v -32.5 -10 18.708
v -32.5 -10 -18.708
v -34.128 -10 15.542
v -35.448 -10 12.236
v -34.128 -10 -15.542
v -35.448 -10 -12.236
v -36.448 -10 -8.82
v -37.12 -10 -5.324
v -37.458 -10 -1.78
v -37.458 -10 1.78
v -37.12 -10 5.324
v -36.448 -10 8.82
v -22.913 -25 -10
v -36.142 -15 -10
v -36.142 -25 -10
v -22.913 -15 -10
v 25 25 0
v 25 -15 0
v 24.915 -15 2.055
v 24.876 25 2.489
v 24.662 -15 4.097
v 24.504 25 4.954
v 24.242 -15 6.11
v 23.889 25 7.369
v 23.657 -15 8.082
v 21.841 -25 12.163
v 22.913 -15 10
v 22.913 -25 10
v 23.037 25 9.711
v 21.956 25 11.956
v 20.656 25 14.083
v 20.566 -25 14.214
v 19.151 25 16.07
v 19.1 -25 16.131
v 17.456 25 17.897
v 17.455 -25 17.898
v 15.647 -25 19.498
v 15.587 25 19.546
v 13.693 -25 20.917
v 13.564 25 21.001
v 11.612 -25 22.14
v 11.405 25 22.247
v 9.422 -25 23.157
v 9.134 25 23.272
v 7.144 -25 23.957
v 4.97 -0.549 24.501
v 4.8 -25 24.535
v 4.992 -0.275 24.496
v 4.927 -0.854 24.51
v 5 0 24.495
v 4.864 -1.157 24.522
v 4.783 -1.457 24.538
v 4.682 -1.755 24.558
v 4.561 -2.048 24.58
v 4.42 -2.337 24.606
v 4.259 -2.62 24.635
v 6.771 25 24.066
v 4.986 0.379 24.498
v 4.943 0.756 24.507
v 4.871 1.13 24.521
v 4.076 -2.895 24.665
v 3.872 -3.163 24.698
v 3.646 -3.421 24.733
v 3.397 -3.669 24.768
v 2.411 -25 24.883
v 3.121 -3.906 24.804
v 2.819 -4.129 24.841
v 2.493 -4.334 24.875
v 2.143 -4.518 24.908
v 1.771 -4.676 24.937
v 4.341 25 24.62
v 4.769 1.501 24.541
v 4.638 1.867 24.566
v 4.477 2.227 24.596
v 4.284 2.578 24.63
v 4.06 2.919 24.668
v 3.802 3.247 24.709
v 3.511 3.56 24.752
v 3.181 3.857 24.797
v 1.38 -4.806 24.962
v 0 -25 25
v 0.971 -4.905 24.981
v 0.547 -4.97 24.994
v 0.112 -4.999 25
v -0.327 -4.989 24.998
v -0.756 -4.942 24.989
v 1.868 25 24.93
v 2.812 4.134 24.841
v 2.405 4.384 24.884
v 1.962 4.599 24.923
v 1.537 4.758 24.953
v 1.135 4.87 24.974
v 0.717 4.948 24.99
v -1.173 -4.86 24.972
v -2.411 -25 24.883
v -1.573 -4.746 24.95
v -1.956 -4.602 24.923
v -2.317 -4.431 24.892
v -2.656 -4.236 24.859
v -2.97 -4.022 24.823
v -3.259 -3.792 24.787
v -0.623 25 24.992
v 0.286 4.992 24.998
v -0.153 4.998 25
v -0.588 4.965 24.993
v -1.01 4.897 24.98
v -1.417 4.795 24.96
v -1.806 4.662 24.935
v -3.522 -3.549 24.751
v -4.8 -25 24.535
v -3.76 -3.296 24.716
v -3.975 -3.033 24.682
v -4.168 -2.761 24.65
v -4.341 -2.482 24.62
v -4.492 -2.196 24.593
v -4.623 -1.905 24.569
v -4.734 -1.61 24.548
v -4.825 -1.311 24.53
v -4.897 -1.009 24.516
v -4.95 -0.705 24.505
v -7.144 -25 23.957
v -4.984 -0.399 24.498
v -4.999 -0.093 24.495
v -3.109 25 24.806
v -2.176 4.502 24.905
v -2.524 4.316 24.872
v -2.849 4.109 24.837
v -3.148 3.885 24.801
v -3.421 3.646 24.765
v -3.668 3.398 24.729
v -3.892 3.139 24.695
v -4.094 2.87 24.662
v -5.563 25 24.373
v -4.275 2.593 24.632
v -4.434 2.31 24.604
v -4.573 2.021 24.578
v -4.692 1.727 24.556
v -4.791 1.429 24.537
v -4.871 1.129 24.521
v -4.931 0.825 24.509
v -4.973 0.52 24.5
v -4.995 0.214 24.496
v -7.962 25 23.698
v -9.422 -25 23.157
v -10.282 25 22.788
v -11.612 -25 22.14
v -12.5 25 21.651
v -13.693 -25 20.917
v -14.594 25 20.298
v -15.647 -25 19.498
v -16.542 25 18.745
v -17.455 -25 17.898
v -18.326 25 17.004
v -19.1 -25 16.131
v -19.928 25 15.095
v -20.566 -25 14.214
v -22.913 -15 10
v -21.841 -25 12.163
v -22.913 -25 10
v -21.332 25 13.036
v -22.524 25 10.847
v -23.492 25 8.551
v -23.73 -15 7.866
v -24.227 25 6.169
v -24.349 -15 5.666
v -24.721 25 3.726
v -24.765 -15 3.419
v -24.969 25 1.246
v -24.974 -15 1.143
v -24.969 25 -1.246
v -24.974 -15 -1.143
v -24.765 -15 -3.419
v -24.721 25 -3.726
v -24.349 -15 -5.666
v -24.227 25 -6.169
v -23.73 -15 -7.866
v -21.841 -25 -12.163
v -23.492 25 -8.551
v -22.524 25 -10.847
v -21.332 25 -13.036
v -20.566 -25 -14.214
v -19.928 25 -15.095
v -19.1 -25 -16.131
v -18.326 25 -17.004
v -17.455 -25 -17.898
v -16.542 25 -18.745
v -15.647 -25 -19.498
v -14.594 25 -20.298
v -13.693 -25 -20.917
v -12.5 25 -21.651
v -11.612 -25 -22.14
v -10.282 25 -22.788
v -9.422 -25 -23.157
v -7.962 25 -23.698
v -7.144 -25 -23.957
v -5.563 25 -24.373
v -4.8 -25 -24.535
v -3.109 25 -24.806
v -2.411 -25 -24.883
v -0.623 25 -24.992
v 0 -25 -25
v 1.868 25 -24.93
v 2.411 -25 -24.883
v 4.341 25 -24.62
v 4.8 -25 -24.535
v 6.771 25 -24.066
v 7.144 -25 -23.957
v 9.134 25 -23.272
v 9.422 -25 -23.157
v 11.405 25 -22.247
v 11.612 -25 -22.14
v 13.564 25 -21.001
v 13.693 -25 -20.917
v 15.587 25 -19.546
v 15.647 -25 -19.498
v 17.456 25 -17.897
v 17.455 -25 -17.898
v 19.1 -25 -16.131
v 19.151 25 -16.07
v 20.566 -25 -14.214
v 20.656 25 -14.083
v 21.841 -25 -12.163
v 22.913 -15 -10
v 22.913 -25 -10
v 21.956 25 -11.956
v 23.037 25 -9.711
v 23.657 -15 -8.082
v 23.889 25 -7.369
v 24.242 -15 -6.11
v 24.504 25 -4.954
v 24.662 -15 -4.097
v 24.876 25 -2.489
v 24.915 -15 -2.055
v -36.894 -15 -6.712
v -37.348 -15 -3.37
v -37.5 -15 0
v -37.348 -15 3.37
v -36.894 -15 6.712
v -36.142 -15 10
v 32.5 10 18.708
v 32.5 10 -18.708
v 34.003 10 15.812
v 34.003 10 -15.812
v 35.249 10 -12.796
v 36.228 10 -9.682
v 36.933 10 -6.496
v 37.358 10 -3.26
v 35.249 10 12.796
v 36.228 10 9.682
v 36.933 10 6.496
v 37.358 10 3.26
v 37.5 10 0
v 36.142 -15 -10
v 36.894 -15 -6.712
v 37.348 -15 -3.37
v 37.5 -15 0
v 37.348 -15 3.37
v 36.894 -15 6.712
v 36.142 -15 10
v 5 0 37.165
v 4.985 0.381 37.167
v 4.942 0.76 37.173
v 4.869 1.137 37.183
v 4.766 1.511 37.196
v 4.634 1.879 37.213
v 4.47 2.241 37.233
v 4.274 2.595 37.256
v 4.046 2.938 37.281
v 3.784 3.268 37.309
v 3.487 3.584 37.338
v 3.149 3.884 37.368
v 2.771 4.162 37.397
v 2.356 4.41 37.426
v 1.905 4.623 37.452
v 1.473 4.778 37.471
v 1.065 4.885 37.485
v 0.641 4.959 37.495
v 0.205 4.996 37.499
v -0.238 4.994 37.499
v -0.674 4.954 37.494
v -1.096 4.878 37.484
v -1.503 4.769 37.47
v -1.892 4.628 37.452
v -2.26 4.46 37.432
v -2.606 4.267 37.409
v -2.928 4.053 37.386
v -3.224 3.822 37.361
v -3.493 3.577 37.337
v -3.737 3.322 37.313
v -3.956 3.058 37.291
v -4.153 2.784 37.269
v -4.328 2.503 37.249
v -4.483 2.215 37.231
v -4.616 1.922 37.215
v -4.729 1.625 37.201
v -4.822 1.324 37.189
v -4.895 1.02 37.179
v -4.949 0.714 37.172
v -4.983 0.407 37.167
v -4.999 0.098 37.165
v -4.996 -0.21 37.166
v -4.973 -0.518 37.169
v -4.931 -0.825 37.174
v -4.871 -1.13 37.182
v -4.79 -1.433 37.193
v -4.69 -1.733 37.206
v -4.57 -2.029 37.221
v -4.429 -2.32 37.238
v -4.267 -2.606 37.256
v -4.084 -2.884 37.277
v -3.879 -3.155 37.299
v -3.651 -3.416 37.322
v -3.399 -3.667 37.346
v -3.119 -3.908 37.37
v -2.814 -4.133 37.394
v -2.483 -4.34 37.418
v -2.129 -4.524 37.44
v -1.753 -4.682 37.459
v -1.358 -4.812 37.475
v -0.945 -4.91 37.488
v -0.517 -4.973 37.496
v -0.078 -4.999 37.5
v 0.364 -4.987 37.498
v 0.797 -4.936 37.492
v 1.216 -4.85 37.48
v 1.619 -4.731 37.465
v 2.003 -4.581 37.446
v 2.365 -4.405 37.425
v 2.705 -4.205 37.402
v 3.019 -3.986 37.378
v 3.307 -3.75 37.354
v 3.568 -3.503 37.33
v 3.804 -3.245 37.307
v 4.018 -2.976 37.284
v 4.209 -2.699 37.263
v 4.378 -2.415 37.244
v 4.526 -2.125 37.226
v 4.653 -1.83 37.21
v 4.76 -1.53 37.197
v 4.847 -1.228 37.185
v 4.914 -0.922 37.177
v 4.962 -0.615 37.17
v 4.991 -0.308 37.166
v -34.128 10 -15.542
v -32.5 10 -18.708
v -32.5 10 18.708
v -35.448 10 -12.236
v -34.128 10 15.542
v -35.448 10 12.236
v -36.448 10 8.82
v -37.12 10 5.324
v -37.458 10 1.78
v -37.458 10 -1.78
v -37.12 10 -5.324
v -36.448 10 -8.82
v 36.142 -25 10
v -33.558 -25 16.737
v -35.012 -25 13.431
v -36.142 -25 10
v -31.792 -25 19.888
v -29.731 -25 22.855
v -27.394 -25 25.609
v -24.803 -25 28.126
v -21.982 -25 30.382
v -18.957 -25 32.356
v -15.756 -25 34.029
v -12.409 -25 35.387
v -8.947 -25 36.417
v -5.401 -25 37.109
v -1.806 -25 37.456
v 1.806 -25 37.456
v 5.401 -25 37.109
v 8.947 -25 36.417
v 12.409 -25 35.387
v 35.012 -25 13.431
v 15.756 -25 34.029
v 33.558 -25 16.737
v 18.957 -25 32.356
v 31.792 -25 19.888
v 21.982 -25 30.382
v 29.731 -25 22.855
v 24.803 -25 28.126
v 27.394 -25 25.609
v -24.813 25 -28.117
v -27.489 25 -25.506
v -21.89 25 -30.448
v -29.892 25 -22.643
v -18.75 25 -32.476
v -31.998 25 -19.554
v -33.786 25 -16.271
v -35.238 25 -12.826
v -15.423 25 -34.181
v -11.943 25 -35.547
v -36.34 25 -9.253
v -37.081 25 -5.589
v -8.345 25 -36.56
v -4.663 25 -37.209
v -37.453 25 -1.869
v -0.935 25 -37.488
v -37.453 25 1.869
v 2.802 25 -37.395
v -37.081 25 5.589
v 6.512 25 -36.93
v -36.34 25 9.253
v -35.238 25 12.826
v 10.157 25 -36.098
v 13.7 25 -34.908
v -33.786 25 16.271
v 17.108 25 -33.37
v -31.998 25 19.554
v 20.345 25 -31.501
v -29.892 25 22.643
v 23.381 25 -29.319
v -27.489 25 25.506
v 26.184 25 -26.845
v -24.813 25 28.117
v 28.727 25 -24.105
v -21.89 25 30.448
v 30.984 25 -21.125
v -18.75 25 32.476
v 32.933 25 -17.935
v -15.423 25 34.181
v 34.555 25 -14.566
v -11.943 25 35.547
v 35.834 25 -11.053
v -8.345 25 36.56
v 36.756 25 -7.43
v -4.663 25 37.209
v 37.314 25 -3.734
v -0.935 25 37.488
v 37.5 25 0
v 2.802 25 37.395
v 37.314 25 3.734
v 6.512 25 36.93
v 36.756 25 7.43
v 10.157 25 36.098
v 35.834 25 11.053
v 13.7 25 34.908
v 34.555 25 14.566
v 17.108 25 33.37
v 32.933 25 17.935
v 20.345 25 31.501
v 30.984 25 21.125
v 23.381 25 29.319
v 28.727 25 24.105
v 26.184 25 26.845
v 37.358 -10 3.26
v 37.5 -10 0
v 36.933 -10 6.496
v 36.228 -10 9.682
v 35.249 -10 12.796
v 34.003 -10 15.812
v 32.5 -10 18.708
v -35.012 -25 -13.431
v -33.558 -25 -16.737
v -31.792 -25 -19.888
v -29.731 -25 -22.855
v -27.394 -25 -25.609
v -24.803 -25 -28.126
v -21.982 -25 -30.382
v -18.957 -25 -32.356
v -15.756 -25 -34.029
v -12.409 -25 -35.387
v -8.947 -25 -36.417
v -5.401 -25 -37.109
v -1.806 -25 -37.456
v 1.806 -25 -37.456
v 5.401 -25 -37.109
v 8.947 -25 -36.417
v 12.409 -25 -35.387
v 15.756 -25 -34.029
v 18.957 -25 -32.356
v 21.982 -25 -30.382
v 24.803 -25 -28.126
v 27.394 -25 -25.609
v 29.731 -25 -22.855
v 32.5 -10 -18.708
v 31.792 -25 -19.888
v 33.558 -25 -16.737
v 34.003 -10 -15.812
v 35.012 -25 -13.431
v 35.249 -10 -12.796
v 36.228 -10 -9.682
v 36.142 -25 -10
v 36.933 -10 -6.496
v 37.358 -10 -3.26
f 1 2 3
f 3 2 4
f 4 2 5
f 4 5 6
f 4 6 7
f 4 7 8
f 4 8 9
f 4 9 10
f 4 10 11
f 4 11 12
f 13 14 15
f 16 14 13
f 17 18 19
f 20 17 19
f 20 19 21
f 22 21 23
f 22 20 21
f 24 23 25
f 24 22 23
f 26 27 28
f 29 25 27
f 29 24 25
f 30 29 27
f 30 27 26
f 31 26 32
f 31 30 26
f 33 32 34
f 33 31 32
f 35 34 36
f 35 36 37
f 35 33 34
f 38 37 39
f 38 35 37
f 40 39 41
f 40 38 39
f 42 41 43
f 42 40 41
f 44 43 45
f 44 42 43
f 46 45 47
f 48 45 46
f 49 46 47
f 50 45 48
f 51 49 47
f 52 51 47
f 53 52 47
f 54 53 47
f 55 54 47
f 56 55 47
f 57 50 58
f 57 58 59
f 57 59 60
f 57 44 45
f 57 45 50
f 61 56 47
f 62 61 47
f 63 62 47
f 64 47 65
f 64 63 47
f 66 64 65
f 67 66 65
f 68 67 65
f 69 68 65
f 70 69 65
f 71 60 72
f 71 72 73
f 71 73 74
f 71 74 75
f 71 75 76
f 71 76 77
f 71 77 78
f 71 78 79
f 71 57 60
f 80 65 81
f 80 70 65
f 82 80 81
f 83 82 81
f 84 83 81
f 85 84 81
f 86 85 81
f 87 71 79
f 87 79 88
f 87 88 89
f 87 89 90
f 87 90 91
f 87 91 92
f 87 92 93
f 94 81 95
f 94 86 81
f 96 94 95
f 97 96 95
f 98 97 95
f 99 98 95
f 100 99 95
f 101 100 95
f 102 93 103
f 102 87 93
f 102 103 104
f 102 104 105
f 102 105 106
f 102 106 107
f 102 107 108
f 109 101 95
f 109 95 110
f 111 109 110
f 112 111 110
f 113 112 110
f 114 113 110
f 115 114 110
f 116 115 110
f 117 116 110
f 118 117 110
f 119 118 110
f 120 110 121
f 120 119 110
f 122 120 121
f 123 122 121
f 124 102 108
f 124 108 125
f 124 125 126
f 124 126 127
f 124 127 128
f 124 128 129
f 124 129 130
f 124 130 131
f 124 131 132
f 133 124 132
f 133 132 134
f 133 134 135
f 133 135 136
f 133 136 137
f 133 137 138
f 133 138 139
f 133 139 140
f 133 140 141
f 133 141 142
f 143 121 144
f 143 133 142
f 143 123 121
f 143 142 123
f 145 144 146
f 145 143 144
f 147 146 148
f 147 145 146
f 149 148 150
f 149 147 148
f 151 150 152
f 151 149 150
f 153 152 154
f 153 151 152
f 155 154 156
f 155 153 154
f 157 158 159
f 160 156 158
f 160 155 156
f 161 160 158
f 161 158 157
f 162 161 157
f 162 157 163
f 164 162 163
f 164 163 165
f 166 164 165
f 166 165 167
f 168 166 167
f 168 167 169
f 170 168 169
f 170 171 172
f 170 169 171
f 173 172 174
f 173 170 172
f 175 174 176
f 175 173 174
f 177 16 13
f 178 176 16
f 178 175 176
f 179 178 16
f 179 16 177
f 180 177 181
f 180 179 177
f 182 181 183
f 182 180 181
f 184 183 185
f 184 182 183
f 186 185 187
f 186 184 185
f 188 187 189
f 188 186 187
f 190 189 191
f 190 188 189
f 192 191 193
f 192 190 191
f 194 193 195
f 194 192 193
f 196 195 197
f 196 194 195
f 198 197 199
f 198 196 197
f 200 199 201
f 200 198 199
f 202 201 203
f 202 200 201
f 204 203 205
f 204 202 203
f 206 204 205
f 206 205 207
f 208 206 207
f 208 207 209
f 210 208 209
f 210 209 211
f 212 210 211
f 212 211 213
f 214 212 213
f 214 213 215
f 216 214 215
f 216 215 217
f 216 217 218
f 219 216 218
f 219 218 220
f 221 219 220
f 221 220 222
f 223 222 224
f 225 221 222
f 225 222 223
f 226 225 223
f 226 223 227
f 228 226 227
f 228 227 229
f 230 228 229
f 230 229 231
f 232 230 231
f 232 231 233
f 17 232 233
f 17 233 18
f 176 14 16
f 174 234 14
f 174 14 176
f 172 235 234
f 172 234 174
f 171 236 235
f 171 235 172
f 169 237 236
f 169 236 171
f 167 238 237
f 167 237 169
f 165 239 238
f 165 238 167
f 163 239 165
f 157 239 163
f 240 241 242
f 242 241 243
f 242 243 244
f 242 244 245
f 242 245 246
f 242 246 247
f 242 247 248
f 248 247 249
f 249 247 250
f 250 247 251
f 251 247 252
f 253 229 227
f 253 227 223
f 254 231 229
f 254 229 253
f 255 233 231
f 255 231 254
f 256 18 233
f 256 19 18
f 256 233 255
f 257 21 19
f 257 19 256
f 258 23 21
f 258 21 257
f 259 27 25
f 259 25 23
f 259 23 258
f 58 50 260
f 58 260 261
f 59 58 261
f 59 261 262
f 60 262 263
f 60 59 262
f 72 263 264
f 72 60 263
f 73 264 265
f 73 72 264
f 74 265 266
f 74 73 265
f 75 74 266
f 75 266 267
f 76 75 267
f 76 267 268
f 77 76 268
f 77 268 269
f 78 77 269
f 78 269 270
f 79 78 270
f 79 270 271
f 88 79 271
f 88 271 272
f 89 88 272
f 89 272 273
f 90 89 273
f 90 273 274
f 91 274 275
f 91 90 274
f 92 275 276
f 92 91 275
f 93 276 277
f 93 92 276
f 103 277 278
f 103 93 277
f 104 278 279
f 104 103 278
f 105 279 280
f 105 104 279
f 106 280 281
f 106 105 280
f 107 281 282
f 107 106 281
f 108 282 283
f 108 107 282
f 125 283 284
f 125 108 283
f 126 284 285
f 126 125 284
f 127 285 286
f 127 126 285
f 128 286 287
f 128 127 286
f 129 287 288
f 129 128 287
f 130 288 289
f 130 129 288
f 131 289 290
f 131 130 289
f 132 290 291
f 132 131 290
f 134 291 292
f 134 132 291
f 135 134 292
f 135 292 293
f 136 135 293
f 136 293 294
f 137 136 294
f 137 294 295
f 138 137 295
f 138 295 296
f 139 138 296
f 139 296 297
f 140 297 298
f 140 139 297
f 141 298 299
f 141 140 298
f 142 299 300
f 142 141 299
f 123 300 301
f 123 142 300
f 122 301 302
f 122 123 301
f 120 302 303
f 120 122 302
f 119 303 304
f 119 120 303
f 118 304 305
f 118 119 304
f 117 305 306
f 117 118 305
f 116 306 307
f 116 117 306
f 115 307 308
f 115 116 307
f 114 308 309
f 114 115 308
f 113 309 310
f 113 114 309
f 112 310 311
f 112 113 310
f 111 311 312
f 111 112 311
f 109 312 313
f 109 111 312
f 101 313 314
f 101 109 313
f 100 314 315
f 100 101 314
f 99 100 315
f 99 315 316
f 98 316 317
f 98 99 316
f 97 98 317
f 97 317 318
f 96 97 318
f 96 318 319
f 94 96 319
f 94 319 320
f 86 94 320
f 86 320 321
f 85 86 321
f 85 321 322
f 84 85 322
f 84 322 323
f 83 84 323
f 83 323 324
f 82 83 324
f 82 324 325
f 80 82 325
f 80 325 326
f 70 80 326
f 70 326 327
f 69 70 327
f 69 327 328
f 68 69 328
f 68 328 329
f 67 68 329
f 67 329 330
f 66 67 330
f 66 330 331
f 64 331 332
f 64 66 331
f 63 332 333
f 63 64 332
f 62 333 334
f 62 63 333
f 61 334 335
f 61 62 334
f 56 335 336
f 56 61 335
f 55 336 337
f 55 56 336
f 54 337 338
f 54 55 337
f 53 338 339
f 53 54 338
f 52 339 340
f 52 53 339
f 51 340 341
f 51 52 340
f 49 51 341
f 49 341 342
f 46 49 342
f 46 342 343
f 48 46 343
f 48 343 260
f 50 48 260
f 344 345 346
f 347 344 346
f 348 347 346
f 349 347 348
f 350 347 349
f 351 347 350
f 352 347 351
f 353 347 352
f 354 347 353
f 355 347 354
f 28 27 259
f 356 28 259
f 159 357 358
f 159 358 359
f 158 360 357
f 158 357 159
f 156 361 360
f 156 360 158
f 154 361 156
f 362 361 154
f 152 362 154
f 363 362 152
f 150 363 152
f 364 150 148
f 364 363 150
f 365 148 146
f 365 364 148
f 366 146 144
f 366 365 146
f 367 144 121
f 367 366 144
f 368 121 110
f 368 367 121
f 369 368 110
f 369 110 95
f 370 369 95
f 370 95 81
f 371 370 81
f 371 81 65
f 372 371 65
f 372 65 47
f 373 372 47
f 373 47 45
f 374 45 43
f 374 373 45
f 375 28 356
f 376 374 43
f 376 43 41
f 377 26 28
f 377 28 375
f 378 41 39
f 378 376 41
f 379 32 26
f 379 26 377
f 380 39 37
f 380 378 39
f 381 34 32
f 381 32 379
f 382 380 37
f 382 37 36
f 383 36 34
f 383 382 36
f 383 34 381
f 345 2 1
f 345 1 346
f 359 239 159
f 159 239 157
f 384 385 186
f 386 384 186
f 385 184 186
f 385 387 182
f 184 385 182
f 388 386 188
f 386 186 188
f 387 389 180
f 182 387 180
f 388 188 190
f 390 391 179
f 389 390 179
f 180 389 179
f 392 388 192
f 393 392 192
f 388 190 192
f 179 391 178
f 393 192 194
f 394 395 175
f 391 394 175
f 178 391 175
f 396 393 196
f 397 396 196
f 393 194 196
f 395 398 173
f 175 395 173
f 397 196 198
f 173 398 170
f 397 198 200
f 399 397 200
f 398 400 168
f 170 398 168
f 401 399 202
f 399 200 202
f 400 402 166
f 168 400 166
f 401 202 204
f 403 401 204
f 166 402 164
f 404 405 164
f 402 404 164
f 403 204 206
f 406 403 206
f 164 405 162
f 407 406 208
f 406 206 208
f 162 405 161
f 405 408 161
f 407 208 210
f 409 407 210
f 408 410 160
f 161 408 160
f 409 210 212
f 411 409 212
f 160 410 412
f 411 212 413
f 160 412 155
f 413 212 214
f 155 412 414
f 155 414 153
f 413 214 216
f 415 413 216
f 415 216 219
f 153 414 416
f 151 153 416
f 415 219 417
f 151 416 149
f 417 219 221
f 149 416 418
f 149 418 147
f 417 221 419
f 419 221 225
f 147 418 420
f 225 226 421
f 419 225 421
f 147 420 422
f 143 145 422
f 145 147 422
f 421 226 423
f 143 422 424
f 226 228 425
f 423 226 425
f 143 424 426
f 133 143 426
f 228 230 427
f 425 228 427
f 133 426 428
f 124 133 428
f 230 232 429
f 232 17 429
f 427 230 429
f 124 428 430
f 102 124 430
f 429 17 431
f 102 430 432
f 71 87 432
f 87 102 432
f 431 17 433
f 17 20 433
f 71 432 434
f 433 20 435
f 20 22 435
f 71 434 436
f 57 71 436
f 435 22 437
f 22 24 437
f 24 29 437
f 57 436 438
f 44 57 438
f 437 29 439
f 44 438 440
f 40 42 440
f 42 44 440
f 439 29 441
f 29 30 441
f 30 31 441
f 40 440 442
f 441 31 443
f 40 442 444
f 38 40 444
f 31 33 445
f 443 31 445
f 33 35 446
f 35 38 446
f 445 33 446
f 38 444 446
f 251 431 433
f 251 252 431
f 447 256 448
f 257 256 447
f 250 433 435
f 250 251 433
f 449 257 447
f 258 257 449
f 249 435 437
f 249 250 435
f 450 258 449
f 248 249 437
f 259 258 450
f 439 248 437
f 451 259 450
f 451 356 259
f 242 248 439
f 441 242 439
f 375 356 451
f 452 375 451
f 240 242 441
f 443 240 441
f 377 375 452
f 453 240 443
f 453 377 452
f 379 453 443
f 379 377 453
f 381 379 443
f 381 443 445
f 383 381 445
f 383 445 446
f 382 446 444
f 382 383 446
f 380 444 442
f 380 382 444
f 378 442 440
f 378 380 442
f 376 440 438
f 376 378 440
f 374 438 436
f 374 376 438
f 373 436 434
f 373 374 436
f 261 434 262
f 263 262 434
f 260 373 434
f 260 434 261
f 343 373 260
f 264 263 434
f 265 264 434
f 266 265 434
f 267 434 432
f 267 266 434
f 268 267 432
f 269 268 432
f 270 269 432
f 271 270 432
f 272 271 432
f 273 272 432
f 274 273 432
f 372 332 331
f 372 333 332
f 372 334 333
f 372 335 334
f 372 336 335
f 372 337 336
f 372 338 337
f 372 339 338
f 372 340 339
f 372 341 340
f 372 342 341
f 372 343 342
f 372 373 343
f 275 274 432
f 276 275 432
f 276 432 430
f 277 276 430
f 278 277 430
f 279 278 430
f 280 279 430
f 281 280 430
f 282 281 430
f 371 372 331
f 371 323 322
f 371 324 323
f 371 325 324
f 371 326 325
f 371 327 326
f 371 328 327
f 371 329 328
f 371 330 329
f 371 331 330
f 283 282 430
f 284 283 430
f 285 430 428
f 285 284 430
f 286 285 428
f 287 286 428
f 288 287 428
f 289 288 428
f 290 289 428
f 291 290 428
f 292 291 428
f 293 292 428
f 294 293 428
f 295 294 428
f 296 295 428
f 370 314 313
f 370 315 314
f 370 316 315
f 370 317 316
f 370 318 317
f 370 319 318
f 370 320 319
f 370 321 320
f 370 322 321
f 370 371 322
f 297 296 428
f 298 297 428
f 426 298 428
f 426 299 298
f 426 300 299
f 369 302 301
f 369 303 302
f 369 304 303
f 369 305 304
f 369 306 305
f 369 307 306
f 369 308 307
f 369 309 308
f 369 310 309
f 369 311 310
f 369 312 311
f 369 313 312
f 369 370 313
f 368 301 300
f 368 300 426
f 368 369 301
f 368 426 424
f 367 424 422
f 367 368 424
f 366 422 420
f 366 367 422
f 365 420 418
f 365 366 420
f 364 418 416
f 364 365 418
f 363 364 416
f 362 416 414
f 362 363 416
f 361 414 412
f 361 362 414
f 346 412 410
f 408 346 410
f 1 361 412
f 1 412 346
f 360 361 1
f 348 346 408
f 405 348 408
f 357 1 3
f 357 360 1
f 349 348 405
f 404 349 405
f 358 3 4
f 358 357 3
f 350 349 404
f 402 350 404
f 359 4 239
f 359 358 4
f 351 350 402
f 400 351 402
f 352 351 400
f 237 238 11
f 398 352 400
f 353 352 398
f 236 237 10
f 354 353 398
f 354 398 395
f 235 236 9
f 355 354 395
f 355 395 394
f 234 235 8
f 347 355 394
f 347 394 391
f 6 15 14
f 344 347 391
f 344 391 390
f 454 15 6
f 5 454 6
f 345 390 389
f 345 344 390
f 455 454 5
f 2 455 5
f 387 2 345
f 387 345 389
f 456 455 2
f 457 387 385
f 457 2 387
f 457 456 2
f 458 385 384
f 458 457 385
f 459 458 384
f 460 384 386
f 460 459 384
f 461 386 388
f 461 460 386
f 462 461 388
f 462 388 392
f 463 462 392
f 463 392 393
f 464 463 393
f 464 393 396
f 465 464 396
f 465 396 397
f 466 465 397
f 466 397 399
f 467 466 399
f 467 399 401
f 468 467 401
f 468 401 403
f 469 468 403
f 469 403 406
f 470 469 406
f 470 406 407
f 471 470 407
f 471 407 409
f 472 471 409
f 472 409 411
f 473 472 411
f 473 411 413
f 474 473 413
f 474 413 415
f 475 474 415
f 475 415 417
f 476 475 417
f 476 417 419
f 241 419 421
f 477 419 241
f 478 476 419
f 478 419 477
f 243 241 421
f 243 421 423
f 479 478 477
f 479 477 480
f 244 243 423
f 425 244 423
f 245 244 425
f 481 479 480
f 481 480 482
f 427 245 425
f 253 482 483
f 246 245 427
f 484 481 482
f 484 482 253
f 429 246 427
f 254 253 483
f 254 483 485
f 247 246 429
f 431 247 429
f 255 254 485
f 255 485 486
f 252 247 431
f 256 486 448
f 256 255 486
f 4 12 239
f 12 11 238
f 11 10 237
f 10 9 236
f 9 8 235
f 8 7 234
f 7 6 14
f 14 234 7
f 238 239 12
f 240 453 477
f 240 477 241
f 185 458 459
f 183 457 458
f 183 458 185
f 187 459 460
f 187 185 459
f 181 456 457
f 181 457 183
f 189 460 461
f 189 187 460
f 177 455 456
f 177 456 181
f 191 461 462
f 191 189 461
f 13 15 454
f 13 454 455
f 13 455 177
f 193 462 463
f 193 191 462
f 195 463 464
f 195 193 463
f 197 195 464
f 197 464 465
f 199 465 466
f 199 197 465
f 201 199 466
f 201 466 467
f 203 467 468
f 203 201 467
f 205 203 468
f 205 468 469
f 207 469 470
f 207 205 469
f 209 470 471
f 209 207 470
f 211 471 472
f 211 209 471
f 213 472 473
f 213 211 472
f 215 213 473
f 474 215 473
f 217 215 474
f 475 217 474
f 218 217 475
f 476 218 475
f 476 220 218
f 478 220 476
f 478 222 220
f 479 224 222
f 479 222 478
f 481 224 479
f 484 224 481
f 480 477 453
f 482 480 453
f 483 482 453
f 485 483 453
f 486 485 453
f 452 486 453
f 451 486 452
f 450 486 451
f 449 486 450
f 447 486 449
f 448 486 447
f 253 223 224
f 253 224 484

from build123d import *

# Parameters (mm, degrees)
F0_R     = 37.5
F0_R_2   = 25
F1_DEPTH = 25
F2_W     = 5
F2_H     = 20
F3_DEPTH = 50
F2_W_2   = 75
F2_H_2   = 10
F4_DEPTH = 10
F5_DEPTH = 10
F2_R     = 5
F6_DEPTH = 37.501


with BuildPart() as f1:
    # F0 (on Front) → F1 (new body, symmetric)
    with BuildSketch(Plane.XZ):
        Circle(F0_R)
        Circle(F0_R_2, mode=Mode.SUBTRACT)
    extrude(amount=F1_DEPTH, both=True)

    # F2 (on Top) → F3 (cut, symmetric)
    with BuildSketch(Plane.XY):
        with Locations((-35, 0)):
            Rectangle(F2_W, F2_H)
        with Locations((35, 0)):
            Rectangle(F2_W, F2_H)
    extrude(amount=F3_DEPTH, both=True, mode=Mode.SUBTRACT)

    # F2 (on Top) → F4 (cut, symmetric)
    with BuildSketch(Plane.XY):
        with Locations((0, -20)):
            Rectangle(F2_W_2, F2_H_2)
    extrude(amount=F4_DEPTH, both=True, mode=Mode.SUBTRACT)

    # F2 (on Top) → F5 (cut, symmetric)
    with BuildSketch(Plane.XY):
        with Locations((0, -20)):
            Rectangle(F2_W_2, F2_H_2)
    extrude(amount=F5_DEPTH, both=True, mode=Mode.SUBTRACT)

    # F2 (on Top) → F6 (cut, through all)
    with BuildSketch(Plane.XY):
        Circle(F2_R)
    extrude(amount=F6_DEPTH, mode=Mode.SUBTRACT)


solid = f1.part
